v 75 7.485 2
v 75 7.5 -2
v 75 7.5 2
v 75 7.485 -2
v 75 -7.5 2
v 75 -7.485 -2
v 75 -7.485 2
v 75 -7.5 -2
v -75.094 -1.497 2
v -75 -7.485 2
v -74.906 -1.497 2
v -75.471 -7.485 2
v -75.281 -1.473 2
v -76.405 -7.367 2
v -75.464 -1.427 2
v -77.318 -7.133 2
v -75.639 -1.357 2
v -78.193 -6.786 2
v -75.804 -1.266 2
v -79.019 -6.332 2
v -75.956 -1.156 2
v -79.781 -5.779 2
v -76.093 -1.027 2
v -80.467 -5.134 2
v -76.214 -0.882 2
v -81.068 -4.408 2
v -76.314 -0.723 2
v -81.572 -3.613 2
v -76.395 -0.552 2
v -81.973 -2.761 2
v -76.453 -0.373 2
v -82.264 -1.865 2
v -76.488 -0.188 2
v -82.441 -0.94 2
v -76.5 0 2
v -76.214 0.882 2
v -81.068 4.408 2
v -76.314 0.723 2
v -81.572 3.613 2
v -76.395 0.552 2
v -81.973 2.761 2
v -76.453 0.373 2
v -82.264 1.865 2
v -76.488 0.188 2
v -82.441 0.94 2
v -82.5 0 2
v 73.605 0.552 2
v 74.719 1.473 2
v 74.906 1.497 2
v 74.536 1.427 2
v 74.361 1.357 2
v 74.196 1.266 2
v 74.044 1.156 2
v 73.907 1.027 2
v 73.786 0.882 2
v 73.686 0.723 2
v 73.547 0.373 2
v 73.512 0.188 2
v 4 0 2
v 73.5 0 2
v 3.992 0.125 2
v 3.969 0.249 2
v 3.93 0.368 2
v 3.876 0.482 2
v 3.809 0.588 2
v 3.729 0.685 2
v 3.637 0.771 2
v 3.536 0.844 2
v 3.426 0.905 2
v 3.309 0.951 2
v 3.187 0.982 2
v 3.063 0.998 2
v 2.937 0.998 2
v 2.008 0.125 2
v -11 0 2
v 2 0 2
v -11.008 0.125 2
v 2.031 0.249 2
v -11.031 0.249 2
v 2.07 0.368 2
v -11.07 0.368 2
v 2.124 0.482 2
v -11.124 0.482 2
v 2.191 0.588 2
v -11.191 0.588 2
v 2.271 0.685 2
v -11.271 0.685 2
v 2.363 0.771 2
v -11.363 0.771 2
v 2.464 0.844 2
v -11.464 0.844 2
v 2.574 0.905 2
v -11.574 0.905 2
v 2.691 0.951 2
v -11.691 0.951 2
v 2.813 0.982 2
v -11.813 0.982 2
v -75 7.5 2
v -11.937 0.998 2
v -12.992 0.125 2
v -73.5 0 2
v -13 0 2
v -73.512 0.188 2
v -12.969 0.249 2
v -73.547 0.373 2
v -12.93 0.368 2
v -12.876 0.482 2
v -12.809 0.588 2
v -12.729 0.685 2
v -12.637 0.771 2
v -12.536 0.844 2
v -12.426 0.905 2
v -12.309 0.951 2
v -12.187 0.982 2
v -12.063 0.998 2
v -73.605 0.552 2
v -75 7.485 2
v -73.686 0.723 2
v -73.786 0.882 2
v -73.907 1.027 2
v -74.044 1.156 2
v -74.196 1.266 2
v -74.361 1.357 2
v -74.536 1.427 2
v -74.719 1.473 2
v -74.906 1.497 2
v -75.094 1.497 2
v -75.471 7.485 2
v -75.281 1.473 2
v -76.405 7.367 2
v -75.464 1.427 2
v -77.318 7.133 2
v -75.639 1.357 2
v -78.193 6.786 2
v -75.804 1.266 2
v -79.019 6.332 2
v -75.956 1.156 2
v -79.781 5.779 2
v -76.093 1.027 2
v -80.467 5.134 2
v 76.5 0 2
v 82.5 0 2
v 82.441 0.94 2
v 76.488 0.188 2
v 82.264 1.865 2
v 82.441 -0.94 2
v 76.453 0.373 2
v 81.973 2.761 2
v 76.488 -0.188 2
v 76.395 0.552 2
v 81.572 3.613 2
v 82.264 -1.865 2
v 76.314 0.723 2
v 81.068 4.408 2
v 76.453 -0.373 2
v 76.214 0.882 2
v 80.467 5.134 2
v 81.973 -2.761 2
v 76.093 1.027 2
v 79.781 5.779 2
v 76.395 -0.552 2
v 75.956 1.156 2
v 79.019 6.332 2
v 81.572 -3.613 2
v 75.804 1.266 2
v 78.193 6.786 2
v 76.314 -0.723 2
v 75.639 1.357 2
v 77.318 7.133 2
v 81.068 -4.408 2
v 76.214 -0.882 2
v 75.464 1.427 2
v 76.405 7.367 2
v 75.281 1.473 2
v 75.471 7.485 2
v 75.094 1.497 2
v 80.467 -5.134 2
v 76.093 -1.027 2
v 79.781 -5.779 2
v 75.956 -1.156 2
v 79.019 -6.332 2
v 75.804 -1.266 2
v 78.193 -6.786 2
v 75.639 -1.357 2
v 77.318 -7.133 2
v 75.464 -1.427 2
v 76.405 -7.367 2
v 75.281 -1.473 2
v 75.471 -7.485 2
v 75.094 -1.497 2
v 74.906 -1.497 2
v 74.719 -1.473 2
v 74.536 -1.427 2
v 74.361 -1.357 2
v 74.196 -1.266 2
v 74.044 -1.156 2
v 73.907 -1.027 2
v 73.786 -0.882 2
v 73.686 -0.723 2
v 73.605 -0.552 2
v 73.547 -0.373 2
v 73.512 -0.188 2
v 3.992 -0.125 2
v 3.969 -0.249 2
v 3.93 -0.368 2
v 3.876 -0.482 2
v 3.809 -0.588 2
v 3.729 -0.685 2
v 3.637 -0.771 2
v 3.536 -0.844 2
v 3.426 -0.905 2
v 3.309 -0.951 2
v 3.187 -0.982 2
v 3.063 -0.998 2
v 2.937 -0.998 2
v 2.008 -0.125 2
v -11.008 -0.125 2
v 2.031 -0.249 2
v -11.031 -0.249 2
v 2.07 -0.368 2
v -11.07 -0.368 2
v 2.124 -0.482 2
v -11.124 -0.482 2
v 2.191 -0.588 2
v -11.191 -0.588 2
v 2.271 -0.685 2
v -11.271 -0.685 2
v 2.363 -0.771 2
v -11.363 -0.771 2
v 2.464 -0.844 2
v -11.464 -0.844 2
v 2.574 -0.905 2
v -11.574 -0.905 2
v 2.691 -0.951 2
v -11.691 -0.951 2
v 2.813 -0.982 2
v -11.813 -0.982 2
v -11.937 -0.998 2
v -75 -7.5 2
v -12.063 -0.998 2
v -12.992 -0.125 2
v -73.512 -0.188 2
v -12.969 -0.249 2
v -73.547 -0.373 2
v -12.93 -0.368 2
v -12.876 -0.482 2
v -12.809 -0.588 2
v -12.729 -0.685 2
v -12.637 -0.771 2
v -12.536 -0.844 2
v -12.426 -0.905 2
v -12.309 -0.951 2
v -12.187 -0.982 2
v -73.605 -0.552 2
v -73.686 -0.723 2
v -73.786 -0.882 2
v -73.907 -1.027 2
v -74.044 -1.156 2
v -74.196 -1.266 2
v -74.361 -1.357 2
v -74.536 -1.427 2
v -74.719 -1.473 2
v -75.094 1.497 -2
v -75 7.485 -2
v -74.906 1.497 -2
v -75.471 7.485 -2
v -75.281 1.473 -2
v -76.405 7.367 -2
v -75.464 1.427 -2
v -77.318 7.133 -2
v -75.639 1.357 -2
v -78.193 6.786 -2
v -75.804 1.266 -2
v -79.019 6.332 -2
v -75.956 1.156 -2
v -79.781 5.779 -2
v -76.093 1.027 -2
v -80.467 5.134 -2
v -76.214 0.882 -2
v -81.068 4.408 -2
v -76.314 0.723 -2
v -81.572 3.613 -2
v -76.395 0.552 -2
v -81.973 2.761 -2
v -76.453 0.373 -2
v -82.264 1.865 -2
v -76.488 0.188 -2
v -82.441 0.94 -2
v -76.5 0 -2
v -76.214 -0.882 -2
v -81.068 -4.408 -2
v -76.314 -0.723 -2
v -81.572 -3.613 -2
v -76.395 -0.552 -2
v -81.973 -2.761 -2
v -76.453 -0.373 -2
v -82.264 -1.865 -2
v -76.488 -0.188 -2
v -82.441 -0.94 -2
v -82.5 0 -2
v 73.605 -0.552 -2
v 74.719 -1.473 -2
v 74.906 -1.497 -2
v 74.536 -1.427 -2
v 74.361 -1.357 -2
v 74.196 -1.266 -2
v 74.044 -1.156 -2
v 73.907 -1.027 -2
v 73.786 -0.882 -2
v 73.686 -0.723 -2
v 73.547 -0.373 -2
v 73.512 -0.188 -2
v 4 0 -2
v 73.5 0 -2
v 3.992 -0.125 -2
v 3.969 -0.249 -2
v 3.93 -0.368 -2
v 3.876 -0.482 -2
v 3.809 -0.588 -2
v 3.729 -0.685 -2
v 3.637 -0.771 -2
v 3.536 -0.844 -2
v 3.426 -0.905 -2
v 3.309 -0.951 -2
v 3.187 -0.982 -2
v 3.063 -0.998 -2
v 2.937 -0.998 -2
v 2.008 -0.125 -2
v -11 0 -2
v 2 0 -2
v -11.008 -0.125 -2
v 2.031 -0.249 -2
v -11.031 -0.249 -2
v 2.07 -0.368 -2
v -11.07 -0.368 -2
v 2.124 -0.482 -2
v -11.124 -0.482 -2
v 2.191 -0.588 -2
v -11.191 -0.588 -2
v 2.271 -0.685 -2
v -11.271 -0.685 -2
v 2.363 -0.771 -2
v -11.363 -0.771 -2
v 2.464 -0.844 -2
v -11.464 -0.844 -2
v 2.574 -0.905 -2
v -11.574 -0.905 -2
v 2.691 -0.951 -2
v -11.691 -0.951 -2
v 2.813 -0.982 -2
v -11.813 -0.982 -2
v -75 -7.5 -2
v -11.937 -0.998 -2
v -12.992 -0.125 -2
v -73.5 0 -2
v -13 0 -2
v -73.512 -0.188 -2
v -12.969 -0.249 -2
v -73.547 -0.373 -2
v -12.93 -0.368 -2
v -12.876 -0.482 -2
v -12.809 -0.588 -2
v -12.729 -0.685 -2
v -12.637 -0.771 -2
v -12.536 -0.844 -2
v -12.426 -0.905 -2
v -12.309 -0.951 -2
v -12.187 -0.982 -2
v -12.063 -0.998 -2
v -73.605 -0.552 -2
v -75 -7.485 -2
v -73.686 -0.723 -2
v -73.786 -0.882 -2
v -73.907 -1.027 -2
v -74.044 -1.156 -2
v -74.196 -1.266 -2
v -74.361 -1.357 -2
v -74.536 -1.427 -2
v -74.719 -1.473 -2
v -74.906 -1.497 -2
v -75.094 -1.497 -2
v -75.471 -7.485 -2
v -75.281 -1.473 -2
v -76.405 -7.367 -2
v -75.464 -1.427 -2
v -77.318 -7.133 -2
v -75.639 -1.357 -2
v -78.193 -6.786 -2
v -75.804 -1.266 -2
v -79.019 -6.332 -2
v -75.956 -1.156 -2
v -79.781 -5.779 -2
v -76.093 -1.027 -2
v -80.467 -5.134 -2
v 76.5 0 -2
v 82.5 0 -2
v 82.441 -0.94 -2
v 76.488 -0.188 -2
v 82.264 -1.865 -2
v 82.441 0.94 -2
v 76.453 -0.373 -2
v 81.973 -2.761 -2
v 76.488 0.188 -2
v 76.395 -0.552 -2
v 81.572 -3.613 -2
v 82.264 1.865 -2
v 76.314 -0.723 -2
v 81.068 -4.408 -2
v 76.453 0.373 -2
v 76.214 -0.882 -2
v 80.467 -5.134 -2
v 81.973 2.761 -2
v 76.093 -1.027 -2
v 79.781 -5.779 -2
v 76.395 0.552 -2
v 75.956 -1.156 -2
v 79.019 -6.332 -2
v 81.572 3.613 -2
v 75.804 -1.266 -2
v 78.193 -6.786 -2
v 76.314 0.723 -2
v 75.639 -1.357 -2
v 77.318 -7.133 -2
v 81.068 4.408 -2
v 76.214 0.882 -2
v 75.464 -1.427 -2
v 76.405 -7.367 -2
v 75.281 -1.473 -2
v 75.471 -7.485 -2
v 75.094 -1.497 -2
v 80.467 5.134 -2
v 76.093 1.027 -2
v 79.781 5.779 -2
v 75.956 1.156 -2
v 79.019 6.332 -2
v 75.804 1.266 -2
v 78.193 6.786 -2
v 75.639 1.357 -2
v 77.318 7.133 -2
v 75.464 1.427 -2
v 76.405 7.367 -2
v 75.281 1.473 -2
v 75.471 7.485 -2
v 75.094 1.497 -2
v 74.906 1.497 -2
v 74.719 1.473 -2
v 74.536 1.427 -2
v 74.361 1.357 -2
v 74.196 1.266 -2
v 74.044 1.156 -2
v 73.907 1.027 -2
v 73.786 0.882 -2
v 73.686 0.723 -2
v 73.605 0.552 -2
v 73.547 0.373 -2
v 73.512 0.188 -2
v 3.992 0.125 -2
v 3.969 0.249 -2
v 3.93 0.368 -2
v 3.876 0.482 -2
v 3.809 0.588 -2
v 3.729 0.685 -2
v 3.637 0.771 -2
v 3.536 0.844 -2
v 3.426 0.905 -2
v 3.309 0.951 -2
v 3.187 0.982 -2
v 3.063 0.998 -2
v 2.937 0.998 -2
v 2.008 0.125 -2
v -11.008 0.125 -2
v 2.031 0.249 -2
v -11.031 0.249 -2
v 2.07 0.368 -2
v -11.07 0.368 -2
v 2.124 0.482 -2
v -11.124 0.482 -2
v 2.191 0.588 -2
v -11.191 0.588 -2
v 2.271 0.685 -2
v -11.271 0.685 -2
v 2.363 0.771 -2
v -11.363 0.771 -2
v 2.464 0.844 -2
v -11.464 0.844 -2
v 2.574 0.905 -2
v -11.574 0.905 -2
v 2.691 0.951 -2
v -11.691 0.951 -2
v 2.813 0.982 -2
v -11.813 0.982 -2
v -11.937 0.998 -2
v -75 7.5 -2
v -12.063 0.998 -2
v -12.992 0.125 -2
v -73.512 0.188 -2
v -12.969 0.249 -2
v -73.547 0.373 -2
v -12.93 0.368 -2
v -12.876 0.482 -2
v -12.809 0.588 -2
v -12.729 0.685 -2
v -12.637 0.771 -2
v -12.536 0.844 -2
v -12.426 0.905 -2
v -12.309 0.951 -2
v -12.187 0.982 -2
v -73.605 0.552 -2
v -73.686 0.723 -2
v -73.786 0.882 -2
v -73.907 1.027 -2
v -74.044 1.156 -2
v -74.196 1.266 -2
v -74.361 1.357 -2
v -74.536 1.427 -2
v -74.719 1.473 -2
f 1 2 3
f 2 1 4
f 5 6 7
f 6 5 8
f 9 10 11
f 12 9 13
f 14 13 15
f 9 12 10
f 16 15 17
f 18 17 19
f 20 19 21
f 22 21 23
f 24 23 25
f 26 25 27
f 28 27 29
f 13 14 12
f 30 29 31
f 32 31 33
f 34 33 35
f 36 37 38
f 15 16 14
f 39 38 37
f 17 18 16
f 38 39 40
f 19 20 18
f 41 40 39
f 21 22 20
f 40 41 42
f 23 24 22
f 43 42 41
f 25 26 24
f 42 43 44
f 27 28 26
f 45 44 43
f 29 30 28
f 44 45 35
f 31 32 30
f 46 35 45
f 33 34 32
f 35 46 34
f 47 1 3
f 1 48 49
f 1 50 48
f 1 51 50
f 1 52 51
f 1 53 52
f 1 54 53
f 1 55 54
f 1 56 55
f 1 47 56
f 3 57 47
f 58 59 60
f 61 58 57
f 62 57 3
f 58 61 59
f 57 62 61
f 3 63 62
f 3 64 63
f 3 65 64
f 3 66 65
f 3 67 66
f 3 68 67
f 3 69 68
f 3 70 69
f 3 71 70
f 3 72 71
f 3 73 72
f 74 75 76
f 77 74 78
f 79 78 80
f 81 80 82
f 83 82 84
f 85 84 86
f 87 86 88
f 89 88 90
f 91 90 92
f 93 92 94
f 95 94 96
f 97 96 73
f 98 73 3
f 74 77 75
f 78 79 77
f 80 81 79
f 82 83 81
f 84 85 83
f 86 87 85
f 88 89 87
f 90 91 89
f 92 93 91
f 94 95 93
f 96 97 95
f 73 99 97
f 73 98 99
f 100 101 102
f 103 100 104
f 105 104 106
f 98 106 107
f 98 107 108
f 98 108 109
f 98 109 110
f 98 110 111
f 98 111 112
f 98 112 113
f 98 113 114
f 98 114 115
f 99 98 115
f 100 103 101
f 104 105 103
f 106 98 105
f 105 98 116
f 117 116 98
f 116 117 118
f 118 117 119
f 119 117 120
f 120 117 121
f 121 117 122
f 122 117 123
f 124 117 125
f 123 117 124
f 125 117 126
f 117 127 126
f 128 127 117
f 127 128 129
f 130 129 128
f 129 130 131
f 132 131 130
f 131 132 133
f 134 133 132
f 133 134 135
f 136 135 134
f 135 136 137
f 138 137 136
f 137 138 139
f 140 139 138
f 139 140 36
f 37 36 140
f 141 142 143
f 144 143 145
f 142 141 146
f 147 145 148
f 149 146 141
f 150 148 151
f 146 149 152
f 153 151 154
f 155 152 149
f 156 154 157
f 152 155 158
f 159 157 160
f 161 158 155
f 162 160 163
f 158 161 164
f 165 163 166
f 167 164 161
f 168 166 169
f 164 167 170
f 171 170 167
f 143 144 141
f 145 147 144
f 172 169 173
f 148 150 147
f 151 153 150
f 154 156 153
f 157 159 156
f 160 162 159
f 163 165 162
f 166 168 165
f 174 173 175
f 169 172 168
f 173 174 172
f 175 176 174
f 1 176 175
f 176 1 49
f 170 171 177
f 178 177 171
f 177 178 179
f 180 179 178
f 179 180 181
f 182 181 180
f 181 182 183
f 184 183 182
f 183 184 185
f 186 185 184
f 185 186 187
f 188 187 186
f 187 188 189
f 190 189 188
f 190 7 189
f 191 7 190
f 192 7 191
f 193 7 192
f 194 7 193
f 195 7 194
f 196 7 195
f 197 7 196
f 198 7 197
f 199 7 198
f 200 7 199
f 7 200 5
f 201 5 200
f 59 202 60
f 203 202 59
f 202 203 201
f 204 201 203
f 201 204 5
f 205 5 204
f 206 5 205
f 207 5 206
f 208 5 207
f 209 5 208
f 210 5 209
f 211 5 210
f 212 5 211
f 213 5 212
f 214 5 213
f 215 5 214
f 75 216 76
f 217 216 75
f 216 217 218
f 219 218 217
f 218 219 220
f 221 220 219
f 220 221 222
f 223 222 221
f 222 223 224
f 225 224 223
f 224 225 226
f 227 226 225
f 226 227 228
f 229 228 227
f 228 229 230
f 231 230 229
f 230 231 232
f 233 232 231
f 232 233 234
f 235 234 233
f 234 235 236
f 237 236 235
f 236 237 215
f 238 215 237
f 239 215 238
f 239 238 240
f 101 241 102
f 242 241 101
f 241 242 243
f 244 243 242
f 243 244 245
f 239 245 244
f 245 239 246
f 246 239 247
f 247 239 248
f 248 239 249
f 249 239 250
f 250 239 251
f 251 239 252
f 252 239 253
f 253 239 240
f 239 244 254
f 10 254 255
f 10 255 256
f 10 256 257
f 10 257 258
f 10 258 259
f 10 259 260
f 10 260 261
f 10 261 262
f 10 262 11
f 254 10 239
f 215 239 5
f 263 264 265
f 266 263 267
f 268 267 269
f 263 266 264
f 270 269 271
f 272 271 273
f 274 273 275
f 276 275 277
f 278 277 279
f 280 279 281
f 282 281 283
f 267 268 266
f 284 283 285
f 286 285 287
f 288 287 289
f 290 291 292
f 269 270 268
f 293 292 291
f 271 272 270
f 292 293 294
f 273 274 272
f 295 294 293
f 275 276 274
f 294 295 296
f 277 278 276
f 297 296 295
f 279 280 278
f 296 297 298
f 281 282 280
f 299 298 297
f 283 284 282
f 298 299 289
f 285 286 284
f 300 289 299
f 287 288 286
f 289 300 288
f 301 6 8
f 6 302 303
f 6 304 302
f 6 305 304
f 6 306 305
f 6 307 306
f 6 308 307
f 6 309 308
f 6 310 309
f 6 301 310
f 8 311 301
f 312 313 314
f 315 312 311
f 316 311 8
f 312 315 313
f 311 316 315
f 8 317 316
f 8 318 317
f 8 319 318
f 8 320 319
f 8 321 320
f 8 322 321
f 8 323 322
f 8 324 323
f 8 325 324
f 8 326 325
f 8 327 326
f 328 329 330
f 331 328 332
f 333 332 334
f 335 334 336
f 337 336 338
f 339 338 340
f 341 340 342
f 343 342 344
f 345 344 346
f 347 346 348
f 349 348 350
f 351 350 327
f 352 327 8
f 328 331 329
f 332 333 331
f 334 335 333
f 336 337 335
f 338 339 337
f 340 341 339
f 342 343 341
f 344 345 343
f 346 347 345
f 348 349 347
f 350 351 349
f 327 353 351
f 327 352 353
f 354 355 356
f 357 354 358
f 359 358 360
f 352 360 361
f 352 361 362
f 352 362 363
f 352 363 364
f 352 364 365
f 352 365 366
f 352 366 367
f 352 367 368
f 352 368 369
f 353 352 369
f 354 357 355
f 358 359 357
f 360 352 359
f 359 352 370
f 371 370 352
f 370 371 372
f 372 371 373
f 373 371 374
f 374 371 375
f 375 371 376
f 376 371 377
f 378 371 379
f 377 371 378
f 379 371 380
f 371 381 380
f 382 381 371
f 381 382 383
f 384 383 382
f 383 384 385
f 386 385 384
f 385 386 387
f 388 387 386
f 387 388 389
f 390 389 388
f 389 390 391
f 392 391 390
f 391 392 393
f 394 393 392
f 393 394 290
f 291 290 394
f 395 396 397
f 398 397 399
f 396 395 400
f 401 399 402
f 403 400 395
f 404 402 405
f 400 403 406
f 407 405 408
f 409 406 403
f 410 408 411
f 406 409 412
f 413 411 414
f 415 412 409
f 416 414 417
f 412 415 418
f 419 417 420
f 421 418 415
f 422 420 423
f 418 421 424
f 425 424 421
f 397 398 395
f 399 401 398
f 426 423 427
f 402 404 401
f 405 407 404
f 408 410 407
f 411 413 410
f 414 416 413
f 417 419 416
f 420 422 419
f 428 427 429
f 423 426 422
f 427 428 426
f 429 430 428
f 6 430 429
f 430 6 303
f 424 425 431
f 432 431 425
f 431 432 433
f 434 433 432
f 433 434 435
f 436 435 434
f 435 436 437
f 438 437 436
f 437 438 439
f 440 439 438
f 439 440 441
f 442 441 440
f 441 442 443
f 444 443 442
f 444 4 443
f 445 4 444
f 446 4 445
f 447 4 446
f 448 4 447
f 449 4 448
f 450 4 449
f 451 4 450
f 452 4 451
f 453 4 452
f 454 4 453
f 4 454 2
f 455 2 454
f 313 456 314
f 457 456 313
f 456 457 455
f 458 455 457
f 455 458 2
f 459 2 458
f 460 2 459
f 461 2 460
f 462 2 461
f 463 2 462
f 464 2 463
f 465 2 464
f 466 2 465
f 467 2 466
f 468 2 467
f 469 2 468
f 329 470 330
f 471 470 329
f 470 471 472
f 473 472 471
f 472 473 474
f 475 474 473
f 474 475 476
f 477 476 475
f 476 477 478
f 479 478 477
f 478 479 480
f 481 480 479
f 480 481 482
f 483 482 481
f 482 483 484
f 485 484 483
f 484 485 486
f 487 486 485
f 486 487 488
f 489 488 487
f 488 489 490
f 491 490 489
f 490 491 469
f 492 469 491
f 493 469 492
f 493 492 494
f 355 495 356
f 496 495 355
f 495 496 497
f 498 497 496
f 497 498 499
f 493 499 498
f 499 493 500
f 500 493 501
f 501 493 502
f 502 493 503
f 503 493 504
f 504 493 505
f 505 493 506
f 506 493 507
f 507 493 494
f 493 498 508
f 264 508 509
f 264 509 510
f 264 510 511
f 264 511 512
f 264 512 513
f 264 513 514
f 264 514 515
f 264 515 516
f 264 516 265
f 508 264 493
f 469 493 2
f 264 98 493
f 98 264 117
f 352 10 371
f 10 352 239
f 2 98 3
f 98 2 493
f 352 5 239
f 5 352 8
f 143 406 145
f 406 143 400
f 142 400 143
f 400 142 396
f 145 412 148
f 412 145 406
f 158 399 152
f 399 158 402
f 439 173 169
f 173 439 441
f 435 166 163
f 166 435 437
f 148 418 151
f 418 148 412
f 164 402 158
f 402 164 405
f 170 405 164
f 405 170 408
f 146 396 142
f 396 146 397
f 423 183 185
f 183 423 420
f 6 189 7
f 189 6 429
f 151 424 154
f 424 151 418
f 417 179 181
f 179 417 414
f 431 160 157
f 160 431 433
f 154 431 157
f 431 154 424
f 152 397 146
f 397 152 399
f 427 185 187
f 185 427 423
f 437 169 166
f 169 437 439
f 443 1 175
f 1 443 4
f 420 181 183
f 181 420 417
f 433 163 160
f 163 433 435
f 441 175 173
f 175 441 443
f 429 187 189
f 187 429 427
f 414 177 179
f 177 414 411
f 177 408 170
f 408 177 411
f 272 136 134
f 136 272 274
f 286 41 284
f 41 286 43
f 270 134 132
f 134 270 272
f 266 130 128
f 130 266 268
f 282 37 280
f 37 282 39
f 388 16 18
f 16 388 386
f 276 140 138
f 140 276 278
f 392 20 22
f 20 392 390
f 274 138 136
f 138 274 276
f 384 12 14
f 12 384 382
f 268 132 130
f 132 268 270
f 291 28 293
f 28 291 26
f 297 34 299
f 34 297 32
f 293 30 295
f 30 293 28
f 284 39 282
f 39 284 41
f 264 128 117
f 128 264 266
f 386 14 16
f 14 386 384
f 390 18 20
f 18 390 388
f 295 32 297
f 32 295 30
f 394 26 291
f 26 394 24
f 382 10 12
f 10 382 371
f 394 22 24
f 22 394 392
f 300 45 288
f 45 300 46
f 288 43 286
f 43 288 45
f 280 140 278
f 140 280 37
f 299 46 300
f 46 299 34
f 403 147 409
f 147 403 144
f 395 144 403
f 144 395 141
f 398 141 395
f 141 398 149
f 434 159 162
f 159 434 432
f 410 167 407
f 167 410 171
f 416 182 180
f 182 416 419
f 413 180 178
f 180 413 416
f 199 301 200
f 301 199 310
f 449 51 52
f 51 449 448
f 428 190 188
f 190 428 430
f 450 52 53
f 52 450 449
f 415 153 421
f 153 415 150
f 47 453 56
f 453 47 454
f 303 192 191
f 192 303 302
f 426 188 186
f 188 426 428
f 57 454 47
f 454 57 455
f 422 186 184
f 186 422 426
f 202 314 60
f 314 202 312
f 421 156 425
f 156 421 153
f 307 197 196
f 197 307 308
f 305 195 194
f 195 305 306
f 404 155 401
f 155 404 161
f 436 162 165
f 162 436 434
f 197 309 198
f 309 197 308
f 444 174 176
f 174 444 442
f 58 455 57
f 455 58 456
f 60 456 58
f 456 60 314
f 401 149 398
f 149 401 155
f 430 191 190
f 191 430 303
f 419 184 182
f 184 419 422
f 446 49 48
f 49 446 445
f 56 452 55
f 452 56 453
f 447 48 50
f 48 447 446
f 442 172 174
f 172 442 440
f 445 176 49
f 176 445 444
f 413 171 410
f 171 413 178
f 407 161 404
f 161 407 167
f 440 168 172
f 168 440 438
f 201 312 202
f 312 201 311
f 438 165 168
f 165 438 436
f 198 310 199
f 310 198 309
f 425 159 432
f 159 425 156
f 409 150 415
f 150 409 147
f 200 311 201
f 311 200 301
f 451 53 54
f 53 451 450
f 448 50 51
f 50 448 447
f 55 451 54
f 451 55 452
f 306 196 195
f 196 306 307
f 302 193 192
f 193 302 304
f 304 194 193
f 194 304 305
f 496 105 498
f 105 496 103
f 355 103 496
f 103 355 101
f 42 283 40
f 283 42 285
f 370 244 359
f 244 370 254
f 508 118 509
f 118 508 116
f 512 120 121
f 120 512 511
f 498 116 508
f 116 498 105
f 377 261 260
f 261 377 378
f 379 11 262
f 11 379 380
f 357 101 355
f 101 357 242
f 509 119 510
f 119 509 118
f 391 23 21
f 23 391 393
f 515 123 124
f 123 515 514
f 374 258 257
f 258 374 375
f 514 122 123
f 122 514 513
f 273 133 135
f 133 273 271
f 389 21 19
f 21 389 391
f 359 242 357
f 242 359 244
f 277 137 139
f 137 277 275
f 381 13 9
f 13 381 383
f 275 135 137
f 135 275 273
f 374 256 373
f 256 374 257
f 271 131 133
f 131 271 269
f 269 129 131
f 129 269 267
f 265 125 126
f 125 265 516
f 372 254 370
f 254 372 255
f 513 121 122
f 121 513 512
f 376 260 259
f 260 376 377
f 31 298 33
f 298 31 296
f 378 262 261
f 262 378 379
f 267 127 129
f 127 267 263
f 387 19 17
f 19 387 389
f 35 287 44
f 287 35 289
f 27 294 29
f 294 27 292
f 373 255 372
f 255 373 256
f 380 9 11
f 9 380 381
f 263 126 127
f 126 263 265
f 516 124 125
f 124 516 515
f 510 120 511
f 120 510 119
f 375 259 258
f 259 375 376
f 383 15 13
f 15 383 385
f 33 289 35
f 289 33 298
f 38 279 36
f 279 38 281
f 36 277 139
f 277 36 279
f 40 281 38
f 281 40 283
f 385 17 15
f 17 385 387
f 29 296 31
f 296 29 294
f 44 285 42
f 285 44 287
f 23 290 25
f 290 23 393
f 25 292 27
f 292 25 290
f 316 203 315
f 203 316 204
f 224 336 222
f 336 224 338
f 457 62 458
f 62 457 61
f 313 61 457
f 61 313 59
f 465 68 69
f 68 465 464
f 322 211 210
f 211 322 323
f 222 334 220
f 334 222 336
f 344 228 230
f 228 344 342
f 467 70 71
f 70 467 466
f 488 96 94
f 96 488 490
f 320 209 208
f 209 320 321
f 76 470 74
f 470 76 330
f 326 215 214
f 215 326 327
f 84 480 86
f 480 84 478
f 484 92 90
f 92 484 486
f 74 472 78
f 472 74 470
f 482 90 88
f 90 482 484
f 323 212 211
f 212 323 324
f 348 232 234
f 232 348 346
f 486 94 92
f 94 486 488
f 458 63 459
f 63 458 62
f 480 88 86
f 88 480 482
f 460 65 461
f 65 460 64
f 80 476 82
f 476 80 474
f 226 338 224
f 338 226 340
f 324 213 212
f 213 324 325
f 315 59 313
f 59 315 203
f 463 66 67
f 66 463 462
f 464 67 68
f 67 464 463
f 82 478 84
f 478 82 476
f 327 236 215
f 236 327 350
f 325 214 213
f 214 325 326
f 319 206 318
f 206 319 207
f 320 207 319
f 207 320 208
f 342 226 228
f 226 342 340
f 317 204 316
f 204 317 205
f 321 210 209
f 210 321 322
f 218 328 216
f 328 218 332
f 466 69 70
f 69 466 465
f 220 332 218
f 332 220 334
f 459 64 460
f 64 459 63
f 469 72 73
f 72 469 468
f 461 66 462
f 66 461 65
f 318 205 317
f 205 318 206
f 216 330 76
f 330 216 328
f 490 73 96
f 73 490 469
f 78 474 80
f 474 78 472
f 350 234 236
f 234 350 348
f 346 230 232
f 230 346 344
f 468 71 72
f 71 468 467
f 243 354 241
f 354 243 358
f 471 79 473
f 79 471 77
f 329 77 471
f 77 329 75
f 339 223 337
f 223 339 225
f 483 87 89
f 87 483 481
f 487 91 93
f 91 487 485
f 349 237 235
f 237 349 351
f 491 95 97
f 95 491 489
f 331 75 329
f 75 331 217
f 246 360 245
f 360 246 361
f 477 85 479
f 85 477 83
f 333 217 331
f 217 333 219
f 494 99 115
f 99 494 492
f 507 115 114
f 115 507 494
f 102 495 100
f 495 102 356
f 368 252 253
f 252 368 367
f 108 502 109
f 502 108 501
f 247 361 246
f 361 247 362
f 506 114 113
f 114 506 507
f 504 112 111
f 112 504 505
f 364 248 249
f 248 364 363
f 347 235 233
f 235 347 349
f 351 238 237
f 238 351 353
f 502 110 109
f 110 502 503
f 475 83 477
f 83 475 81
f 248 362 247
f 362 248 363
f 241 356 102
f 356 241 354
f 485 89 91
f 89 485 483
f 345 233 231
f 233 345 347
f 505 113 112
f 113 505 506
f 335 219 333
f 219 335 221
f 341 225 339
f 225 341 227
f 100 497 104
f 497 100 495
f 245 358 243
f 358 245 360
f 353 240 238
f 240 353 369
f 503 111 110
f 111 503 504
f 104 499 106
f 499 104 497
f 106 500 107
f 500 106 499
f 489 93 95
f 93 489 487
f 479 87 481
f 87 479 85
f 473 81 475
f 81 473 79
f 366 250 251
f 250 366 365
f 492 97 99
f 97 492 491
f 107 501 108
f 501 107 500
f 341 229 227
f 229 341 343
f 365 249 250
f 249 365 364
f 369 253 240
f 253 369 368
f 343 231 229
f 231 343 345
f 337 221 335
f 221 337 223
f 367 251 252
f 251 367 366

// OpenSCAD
//Author: Piotr Paterek, Kraków 05-08.2016
$fn=50;
module cal(){
cube([150,15,4], center=true);
translate([75,0,0])
                {
                    cylinder(r=7.5, h=4, center=true);
                }
translate([-75,0,0])
                {
                    cylinder(r=7.5, h=4, center=true);
                }
            }

difference()
{
    difference()
    {
        difference()
        {
            difference()
            {
                cal();
                translate([75,0,0])
                {
                    cylinder(r=1.5, h=4, center=true);
                }
            }
            translate([-75,0,0])
                {
                    cylinder(r=1.5, h=4, center=true);
                }
        }
        translate([3,0,0])
            {
                cylinder(r=1, h=4, center=true);
            }
    }
    translate([-12,0,0])
                {
                    cylinder(r=1, h=4, center=true);
                }
        }
        
